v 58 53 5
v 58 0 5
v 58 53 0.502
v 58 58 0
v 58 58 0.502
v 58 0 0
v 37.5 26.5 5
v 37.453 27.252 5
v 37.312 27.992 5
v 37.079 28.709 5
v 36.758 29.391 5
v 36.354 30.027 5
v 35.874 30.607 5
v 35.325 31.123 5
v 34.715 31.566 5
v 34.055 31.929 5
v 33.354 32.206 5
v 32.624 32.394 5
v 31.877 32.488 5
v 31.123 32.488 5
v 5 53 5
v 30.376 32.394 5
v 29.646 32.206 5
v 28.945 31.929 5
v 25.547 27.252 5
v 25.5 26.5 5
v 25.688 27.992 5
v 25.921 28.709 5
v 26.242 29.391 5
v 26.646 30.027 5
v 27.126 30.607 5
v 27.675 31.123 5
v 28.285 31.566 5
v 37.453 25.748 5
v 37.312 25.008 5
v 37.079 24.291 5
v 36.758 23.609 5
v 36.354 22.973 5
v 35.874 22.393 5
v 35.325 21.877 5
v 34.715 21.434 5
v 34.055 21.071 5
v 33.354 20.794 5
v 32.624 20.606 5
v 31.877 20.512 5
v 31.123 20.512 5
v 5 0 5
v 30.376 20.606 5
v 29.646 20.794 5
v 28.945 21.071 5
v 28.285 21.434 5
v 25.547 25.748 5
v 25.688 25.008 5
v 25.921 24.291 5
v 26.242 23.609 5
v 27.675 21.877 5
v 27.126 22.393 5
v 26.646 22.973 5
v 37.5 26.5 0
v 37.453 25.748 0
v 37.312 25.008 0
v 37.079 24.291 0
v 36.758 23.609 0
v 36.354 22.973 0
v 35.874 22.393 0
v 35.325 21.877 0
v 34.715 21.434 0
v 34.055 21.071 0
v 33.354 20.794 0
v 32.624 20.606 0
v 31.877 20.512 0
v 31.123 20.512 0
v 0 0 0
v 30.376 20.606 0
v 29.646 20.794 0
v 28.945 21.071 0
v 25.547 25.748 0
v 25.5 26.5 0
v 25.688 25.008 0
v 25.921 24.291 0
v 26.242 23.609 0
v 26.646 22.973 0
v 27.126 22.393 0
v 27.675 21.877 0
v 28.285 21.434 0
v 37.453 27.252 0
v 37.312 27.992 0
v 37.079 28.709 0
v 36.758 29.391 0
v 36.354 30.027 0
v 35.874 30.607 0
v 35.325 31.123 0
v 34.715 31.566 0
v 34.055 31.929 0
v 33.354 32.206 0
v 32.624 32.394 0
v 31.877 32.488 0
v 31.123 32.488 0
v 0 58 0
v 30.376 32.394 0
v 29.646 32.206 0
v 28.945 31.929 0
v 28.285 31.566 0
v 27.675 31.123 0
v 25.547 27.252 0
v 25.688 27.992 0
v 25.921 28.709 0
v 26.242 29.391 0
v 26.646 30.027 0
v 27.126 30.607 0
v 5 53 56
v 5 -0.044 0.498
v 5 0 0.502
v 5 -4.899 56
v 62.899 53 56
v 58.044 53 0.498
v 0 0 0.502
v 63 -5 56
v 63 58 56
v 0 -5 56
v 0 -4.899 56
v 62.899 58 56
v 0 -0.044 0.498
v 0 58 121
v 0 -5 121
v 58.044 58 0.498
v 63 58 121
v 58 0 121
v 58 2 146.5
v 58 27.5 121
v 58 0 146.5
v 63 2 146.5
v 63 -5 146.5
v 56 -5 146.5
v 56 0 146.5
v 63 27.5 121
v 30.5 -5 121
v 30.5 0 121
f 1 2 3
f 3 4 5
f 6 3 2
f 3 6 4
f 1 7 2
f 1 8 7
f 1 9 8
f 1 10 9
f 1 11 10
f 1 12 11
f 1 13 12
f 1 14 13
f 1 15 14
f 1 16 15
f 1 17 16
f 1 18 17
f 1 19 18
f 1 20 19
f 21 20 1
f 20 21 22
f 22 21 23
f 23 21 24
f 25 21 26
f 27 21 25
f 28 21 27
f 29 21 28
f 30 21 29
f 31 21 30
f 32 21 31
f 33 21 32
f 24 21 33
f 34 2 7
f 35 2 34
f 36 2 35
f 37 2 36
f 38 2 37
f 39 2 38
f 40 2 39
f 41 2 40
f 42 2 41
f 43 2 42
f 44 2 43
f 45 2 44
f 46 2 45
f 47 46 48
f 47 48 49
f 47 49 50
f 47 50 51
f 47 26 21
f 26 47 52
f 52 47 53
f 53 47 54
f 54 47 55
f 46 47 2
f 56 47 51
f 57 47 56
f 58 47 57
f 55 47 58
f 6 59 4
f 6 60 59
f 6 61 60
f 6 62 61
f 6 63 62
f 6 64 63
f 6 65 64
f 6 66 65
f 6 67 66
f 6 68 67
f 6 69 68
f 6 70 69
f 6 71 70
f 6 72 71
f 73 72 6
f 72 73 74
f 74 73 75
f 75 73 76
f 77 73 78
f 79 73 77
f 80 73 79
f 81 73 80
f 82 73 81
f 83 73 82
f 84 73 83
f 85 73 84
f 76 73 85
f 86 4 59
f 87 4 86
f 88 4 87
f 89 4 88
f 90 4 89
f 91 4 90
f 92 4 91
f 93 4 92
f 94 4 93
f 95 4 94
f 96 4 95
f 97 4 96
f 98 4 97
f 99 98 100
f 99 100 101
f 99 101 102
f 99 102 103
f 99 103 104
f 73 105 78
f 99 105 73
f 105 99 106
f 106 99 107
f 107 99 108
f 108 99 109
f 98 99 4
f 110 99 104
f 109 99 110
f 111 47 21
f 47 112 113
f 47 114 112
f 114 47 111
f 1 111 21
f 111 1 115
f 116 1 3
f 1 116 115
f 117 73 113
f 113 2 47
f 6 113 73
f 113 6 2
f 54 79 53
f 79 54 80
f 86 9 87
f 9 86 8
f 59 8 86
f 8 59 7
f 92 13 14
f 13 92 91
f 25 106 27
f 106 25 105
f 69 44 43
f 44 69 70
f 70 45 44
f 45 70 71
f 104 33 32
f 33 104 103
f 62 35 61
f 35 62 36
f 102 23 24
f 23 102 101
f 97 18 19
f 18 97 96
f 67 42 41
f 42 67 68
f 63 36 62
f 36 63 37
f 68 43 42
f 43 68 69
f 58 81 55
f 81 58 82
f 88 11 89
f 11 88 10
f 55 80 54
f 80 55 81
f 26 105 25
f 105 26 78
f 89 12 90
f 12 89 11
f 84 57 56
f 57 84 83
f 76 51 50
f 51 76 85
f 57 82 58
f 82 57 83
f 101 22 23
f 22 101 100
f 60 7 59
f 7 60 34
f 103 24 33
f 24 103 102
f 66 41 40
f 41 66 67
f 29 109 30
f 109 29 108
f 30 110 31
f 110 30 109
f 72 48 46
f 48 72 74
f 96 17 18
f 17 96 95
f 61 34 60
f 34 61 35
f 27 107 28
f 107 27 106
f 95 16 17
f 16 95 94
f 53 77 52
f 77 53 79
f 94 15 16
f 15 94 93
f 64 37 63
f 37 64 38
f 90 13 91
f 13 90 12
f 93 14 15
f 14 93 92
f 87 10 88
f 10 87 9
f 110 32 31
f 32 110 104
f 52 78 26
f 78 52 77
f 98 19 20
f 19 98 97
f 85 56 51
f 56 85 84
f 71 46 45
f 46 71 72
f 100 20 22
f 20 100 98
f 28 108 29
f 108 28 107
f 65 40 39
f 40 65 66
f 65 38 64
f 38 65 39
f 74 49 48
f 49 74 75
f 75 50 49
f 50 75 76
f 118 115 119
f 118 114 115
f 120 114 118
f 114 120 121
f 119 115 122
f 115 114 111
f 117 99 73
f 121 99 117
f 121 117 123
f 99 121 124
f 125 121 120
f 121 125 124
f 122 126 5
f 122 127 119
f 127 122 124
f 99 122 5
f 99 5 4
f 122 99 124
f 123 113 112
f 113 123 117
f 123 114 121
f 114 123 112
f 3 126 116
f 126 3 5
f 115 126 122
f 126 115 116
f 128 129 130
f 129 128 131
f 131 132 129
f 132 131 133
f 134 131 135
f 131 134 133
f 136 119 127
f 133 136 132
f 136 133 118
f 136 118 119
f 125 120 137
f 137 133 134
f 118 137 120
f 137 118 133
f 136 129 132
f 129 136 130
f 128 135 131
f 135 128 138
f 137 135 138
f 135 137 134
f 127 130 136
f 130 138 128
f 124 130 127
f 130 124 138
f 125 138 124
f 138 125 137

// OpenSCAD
$fn = 50;

// Tolerance to use for the different measurements to accomodate filament thickness.
tolerance = 1;

// Thickness of the vertical walls in the model.
wall_w = 5;
// Thickness of the horizontal walls in the model.
wall_h = 5;

// The width (in mm) of the LACK table's square leg.
lack_leg_width = 51;
leg_width = lack_leg_width + 2 * tolerance;


// The height (in mm) of the LACK table's surface.
lack_surface_height = 50;
surface_height = lack_surface_height + tolerance;

// The extra space (in mm) to add to the top LACK's leg to ensure large objects (like a 3D printer) fit between the stacked tables.
spacer_height = 60;

// The radius (in mm) of the hole that should fit the threaded pole of the LACK table's leg. Make the hole somewhat bigger to ensure it definitely fits inside.
lack_screw_radius = 5;
screw_radius = lack_screw_radius + tolerance;

module floor_area() {
    translate([wall_w, 0, 0]) {
        cube([leg_width, leg_width, wall_h]);
    }
}

module top_area() {
    translate([-wall_w, 0, 0]) {
        cube([leg_width + 2 * wall_w, leg_width + 2 * wall_w, spacer_height + wall_h]);
    }
}

module wall() {
    cube([wall_w, leg_width + wall_w, surface_height + wall_h]);
}

module bottom_wall() {
    union() {
        wall();
        rotate([5, 0, 0]) {
            translate([0, 0, 0.5]) {
                wall();
            }
        }
    }
}

module top_wall() {
    translate([-wall_w, wall_w, -surface_height / 2]) {
        difference(){
            difference(){
                wall();
                translate([0, 0, wall_h]) {
                    rotate([45, 0, 0]) {
                        translate([-wall_w, 0, 0]){
                            cube([wall_w*3, leg_width * 2, surface_height + wall_h]);
                        }
                    }
                }
            }
            cube([2 * wall_w, leg_width * 2, surface_height / 2]);
        }
    }
}

module screw_hole () {
    translate([(leg_width / 2) + wall_w, (leg_width) / 2, wall_h / 2]) {
        cylinder(r = screw_radius, h = wall_h + 1, center = true);
    }
}


// The bottom part
difference() {
    floor_area();
    screw_hole();
}

// The part that wraps around the table
bottom_wall();
rotate(-90) {
    translate([-(leg_width), (leg_width + wall_w), 0]) {
        rotate([180, 180, 0]) bottom_wall();
    }
}

// The top part that includes the mount up
rotate(180) {
    translate([-(leg_width + wall_w), -(leg_width + wall_w), surface_height + wall_h]) { 
        top_area();
        translate([0, 0, spacer_height]) {
            top_wall();
            rotate(-90) 
            translate([-(leg_width + wall_w), (leg_width + wall_w), 0]) {
                mirror([0, 1, 0]) {
                    top_wall();
                }
            }
        }
    }
}
